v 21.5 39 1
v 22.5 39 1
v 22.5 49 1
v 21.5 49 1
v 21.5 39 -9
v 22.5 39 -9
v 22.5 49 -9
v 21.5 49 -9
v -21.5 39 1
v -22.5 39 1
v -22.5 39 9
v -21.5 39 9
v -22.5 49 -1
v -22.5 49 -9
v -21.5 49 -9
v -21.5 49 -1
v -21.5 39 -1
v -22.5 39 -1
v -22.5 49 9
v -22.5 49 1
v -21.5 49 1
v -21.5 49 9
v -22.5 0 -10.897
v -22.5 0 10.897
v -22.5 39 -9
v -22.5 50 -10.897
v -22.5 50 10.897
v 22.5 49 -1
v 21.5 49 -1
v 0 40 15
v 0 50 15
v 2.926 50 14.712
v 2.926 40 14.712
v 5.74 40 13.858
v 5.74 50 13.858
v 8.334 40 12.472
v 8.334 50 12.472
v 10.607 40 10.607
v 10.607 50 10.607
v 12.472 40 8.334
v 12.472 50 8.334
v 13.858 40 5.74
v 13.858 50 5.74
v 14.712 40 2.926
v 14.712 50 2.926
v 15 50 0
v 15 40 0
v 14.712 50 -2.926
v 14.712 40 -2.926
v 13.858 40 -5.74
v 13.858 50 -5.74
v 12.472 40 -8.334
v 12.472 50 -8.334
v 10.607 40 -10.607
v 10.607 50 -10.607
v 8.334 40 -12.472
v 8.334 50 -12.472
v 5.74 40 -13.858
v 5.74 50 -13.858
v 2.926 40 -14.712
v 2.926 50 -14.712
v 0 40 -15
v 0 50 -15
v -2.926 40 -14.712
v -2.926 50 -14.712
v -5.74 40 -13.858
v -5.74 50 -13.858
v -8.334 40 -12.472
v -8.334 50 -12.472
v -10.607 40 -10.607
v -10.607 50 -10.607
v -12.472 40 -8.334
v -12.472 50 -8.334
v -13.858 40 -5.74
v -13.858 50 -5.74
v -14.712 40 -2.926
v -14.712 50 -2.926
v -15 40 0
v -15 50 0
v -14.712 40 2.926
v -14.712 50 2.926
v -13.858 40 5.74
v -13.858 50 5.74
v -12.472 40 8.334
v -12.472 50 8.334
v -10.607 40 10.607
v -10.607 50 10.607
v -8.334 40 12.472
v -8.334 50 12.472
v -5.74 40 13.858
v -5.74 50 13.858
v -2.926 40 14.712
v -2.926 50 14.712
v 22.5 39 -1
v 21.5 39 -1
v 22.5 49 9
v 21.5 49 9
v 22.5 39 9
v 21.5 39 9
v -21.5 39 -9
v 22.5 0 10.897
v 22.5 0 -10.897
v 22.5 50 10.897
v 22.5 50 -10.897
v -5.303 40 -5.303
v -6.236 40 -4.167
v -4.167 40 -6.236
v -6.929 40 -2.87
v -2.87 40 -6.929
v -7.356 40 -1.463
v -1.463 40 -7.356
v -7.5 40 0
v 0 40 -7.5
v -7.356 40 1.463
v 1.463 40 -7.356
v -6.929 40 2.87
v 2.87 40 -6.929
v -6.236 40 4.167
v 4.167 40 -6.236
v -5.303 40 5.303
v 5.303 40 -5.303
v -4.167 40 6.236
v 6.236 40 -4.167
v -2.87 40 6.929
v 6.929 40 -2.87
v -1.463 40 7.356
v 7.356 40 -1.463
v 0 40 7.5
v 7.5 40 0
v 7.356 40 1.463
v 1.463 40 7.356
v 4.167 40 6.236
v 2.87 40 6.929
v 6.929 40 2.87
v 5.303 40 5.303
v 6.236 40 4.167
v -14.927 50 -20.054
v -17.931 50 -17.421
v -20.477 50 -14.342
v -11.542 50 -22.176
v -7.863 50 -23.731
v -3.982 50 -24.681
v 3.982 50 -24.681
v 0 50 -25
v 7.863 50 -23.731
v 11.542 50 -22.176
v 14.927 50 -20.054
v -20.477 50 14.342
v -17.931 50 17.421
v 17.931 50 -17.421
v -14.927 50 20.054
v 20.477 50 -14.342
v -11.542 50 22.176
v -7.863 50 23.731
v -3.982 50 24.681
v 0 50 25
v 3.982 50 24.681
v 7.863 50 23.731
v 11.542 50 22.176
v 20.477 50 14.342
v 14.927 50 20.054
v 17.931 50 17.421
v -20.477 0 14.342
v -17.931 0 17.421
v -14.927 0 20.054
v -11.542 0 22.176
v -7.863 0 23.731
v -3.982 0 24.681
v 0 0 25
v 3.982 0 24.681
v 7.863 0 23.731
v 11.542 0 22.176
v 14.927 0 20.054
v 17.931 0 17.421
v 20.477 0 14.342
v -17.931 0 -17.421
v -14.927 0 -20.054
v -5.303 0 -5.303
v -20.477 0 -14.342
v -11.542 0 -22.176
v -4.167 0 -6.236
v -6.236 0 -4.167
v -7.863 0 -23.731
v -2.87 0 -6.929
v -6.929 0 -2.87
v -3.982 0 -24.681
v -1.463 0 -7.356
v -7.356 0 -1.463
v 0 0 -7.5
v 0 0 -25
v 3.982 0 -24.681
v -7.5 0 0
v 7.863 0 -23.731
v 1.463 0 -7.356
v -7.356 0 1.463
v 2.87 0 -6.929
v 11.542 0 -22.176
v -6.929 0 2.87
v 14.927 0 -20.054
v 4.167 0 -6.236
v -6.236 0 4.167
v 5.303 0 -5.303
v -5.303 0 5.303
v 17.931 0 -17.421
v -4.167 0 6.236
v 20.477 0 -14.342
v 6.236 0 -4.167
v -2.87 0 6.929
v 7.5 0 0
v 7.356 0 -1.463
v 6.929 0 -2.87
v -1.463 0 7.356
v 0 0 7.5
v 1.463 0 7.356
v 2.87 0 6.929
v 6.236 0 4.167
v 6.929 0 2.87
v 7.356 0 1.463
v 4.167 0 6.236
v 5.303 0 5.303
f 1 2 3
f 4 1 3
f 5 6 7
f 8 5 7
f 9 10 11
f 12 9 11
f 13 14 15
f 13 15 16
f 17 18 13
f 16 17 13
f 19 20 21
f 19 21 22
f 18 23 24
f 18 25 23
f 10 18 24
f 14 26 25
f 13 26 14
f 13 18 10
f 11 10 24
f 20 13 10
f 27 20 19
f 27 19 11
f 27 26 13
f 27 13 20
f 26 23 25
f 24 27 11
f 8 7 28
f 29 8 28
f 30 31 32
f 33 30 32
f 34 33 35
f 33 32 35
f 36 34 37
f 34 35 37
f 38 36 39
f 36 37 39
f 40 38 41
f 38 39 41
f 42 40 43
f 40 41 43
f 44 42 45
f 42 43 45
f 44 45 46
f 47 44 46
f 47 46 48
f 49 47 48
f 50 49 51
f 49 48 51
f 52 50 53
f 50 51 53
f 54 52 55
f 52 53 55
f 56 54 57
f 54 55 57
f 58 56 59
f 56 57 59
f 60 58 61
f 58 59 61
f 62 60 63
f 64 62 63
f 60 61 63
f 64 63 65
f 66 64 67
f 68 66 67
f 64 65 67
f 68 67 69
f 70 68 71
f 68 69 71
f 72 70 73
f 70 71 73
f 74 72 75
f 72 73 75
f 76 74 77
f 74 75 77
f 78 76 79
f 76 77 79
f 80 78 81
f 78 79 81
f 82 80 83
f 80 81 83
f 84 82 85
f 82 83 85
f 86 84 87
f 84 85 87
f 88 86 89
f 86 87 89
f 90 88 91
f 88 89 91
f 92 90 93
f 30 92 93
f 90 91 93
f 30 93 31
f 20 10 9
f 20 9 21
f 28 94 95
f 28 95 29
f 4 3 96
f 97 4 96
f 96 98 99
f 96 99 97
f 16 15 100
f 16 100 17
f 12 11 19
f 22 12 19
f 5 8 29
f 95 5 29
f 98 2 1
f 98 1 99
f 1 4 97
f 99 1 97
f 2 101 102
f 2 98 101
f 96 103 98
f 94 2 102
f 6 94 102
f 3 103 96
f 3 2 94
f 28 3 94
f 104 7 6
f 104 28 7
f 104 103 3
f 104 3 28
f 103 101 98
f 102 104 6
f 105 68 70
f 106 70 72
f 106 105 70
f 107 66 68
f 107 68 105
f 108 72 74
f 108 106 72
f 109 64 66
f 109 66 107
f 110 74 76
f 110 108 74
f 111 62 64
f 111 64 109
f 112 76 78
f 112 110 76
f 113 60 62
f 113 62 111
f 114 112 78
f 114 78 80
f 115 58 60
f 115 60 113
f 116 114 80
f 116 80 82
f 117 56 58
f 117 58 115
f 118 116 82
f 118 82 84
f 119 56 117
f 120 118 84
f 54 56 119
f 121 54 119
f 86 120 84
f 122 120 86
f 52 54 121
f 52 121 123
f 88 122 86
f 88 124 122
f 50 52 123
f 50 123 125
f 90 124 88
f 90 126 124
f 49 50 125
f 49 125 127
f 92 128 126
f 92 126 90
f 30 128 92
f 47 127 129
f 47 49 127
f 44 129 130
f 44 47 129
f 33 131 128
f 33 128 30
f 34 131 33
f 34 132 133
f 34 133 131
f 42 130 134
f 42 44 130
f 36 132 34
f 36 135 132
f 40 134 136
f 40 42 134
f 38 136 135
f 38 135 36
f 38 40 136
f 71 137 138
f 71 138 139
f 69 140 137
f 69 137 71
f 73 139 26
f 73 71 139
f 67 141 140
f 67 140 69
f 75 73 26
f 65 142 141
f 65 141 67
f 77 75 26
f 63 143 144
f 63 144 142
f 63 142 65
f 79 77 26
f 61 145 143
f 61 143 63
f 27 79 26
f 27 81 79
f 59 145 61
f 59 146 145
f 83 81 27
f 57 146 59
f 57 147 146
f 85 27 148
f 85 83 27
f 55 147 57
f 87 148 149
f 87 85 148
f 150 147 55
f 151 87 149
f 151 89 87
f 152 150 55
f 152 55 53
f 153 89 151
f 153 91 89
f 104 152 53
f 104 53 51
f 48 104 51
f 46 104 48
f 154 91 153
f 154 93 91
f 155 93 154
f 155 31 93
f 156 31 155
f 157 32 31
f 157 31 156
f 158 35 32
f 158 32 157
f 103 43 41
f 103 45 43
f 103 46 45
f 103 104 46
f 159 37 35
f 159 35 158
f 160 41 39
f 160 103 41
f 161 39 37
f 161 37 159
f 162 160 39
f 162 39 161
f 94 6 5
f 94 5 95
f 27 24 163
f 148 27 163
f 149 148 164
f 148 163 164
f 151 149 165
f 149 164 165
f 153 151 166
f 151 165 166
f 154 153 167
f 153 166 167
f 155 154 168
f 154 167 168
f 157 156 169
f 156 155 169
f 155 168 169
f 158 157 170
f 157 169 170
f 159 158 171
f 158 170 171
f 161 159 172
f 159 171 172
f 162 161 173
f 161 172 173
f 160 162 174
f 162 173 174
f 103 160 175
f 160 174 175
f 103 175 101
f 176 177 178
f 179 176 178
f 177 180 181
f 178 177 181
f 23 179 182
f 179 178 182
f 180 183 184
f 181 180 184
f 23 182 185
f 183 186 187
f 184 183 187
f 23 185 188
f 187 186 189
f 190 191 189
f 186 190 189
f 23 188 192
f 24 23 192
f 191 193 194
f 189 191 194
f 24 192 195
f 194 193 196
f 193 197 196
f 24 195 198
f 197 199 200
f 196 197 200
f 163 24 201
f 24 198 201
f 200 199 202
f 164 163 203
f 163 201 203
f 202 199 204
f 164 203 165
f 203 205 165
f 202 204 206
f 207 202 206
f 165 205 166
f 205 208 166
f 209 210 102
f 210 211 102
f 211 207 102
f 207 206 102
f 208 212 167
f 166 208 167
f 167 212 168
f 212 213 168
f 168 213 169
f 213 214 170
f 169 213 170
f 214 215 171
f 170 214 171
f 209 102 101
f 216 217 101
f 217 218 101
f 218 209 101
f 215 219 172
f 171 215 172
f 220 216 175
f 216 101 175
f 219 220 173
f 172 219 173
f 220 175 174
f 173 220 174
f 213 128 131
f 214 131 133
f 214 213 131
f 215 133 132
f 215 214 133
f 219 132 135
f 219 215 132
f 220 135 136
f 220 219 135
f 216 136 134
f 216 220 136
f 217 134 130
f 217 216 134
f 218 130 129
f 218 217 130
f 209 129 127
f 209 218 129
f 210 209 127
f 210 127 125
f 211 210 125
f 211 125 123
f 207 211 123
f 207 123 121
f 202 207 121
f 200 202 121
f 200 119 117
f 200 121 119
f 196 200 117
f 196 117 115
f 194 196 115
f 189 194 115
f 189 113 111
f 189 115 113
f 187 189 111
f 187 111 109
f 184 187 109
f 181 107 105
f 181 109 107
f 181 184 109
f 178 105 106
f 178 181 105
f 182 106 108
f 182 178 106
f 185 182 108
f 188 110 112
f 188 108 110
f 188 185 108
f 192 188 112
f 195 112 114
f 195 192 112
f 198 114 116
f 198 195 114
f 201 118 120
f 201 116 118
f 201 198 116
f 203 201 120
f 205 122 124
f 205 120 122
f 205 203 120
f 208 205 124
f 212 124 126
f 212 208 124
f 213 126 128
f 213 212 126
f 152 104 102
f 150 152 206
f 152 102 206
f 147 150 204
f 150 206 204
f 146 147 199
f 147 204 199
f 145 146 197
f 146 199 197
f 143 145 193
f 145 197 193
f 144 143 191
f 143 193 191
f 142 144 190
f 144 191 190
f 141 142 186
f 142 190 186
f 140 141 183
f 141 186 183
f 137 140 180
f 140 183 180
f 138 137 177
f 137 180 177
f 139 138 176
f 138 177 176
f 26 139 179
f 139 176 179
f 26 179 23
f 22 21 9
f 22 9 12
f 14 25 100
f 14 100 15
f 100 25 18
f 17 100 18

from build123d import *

# Parameters (mm, degrees)
SKETCH_1_R          = 25
SKETCH_1_R_2        = 7.5
EXTRUDE_1_DEPTH     = 50
SKETCH_2_R          = 15
CUT_EXTRUDE_1_DEPTH = 10
SKETCH_3_OUTSIDE_W  = 69.32
SKETCH_3_OUTSIDE_H  = 69.32
CUT_EXTRUDE_2_DEPTH = 62.23724357
SKETCH_4_W          = 8
SKETCH_4_H          = 10
CUT_EXTRUDE_3_DEPTH = 1


with BuildPart() as part:
    # ｽｹｯﾁ1 → ﾎﾞｽ - 押し出し1 (new body)
    with BuildSketch(Plane(origin=(0, 0, 0), x_dir=(1, 0, 0), z_dir=(0, 1, 0))):
        with Locations(Location((0, 0, 0), (0, 0, 270))):
            Circle(SKETCH_1_R)
        with Locations(Location((0, 0, 0), (0, 0, 270))):
            Circle(SKETCH_1_R_2, mode=Mode.SUBTRACT)
    extrude(amount=EXTRUDE_1_DEPTH)

    # ｽｹｯﾁ2 → ｶｯﾄ - 押し出し1 (cut)
    with BuildSketch(Plane(origin=(0, 50, 0), x_dir=(1, 0, 0), z_dir=(0, 1, 0))):
        with Locations(Location((0, 0, 0), (0, 0, 270))):
            Circle(SKETCH_2_R)
    extrude(amount=-CUT_EXTRUDE_1_DEPTH, mode=Mode.SUBTRACT)

    # ｽｹｯﾁ3 outside → ｶｯﾄ - 押し出し2 (cut, through all)
    with BuildSketch(Plane(origin=(0, 50, 0), x_dir=(1, 0, 0), z_dir=(0, 1, 0))):
        Rectangle(SKETCH_3_OUTSIDE_W, SKETCH_3_OUTSIDE_H)
        with BuildLine():
            Line((-22.5, 10.897247359), (-22.5, -10.897247359))
            ThreePointArc((-22.5, -10.897247359), (0, -25), (22.5, -10.897247359))
            Line((22.5, -10.897247359), (22.5, 10.897247359))
            ThreePointArc((22.5, 10.897247359), (0, 25), (-22.5, 10.897247359))
        make_face(mode=Mode.SUBTRACT)
    extrude(amount=-CUT_EXTRUDE_2_DEPTH, mode=Mode.SUBTRACT)

    # ｽｹｯﾁ4 → ｶｯﾄ - 押し出し3 (cut)
    with BuildSketch(Plane.ZY.offset(22.5)):
        with Locations((-5, 44)):
            Rectangle(SKETCH_4_W, SKETCH_4_H)
        with Locations((5, 44)):
            Rectangle(SKETCH_4_W, SKETCH_4_H)
    cut_extrude_3 = extrude(amount=-CUT_EXTRUDE_3_DEPTH, mode=Mode.SUBTRACT)

    # ﾐﾗｰ1: ｶｯﾄ - 押し出し3 across plane
    add(cut_extrude_3.mirror(Plane(origin=(0, 0, 0), x_dir=(0, 0, 1), z_dir=(1, 0, 0))), mode=Mode.SUBTRACT)


solid = part.part
